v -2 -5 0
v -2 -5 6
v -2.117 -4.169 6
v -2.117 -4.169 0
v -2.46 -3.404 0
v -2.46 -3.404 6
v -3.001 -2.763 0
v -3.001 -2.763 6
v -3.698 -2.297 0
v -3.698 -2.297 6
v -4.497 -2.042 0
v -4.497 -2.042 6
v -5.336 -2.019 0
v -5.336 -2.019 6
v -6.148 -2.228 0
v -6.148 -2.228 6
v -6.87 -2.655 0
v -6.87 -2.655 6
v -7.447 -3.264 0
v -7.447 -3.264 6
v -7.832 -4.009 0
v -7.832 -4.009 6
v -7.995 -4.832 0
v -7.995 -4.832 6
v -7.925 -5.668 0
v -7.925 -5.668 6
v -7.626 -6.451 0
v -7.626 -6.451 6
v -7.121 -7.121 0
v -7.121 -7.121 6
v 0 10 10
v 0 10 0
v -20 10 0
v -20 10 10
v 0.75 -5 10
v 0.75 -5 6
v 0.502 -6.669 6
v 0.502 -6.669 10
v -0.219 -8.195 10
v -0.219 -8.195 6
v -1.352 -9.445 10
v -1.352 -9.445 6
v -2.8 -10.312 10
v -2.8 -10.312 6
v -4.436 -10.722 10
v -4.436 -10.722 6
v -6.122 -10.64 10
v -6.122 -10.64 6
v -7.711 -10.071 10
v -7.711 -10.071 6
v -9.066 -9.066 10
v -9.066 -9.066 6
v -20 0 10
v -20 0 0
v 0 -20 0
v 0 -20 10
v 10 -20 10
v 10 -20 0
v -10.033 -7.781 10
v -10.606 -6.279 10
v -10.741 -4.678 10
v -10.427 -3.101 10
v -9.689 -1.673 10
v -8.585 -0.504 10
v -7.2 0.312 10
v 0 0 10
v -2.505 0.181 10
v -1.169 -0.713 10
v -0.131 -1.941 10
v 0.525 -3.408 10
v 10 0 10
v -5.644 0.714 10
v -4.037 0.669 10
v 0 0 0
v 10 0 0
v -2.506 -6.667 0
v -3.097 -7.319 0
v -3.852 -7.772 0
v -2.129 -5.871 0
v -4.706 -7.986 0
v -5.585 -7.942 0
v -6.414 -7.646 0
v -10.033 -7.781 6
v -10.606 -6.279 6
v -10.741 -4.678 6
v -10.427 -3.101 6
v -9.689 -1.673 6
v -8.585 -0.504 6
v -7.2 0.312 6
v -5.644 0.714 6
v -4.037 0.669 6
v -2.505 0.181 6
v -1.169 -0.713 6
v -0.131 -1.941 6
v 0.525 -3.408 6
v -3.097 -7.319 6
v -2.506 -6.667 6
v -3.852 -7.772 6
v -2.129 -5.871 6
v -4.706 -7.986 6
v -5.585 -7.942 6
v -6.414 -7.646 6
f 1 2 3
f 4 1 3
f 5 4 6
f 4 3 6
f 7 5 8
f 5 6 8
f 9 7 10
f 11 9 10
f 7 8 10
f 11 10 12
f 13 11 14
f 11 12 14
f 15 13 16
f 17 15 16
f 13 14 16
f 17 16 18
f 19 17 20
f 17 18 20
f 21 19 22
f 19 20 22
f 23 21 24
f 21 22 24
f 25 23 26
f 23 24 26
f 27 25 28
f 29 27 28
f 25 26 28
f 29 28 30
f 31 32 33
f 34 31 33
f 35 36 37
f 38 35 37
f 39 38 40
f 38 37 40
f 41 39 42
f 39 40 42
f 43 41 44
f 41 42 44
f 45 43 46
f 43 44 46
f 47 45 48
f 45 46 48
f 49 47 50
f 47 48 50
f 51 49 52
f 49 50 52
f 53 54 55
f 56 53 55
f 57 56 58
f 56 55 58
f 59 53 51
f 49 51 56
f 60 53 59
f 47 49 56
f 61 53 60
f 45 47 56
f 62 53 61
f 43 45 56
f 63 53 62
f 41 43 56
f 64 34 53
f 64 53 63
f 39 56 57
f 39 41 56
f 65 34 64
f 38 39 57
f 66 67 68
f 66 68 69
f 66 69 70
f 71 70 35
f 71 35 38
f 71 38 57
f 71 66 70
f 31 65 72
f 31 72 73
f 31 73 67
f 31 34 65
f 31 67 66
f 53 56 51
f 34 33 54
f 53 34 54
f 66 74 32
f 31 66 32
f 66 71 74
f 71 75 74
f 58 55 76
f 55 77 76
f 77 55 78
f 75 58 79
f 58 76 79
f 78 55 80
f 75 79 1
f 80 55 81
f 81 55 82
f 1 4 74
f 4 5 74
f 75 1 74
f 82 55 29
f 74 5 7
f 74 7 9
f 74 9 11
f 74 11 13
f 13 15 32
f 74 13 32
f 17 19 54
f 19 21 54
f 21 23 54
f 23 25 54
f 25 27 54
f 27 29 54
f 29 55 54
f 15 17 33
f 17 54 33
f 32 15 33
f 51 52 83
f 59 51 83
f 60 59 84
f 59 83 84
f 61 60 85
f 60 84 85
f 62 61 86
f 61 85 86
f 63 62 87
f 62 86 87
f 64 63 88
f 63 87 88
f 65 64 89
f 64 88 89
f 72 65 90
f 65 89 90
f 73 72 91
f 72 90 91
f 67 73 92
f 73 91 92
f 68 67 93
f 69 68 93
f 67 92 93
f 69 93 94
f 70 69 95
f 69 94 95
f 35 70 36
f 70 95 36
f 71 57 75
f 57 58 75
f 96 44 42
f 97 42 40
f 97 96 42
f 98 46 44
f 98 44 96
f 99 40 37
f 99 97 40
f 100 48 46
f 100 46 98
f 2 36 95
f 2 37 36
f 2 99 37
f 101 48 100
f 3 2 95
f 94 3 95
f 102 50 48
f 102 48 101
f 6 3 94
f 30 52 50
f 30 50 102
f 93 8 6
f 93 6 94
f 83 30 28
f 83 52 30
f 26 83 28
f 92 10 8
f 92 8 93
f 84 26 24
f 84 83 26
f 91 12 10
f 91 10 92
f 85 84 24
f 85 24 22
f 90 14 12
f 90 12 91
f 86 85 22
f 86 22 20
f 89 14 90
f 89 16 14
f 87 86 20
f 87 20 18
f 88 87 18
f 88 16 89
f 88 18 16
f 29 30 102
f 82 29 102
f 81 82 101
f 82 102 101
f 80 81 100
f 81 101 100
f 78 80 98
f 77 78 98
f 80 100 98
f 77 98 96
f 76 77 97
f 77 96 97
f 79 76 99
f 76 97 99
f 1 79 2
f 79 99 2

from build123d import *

# Parameters (mm, degrees)
F1_DEPTH = 6
F3_DEPTH = 10
F4_W     = 20
F4_H     = 6
F5_DEPTH = 10
F7_DEPTH = 25
F8_DEPTH = 4


with BuildPart() as f1:
    # F0 (on Top) → F1 (new body)
    with BuildSketch(Plane.XY):
        Polygon((0, -20), (0, 0), (-20, 0), align=None)
    extrude(amount=F1_DEPTH)

    # F3 (add): a face of the model
    f3_faces = [f1.faces().sort_by_distance(p)[0] for p in [
        (-10, 0, 3),
    ]]
    extrude(f3_faces, amount=F3_DEPTH)

    # F4 (on face) → F5 (join)
    with BuildSketch(Plane.YZ):
        with Locations((-10, 3)):
            Rectangle(F4_W, F4_H)
    extrude(amount=F5_DEPTH)

    # F6 (on face) → F7 (cut)
    with BuildSketch(Plane.XY.offset(6)):
        with BuildLine():
            ThreePointArc((-2, -5), (-6.1480502971, -2.2283614025), (-7.1213203436, -7.1213203436))
            ThreePointArc((-7.1213203436, -7.1213203436), (-3.8519497029, -7.7716385975), (-2, -5))
        make_face()
    extrude(amount=-F7_DEPTH, mode=Mode.SUBTRACT)

    # F6 (on face) → F8 (join)
    with BuildSketch(Plane.XY.offset(6)):
        Polygon((-20, 0), (-10, -10), (0, -20), (10, -20), (10, 0), (0, 0), (0, 10), (-20, 10), align=None)
        with BuildLine():
            ThreePointArc((0.75, -5), (-2.7995702639, -10.3123073119), (-9.0658639918, -9.0658639918))
            ThreePointArc((-9.0658639918, -9.0658639918), (-7.2004297361, 0.3123073119), (0.75, -5))
        make_face(mode=Mode.SUBTRACT)
    extrude(amount=F8_DEPTH)


solid = f1.part
